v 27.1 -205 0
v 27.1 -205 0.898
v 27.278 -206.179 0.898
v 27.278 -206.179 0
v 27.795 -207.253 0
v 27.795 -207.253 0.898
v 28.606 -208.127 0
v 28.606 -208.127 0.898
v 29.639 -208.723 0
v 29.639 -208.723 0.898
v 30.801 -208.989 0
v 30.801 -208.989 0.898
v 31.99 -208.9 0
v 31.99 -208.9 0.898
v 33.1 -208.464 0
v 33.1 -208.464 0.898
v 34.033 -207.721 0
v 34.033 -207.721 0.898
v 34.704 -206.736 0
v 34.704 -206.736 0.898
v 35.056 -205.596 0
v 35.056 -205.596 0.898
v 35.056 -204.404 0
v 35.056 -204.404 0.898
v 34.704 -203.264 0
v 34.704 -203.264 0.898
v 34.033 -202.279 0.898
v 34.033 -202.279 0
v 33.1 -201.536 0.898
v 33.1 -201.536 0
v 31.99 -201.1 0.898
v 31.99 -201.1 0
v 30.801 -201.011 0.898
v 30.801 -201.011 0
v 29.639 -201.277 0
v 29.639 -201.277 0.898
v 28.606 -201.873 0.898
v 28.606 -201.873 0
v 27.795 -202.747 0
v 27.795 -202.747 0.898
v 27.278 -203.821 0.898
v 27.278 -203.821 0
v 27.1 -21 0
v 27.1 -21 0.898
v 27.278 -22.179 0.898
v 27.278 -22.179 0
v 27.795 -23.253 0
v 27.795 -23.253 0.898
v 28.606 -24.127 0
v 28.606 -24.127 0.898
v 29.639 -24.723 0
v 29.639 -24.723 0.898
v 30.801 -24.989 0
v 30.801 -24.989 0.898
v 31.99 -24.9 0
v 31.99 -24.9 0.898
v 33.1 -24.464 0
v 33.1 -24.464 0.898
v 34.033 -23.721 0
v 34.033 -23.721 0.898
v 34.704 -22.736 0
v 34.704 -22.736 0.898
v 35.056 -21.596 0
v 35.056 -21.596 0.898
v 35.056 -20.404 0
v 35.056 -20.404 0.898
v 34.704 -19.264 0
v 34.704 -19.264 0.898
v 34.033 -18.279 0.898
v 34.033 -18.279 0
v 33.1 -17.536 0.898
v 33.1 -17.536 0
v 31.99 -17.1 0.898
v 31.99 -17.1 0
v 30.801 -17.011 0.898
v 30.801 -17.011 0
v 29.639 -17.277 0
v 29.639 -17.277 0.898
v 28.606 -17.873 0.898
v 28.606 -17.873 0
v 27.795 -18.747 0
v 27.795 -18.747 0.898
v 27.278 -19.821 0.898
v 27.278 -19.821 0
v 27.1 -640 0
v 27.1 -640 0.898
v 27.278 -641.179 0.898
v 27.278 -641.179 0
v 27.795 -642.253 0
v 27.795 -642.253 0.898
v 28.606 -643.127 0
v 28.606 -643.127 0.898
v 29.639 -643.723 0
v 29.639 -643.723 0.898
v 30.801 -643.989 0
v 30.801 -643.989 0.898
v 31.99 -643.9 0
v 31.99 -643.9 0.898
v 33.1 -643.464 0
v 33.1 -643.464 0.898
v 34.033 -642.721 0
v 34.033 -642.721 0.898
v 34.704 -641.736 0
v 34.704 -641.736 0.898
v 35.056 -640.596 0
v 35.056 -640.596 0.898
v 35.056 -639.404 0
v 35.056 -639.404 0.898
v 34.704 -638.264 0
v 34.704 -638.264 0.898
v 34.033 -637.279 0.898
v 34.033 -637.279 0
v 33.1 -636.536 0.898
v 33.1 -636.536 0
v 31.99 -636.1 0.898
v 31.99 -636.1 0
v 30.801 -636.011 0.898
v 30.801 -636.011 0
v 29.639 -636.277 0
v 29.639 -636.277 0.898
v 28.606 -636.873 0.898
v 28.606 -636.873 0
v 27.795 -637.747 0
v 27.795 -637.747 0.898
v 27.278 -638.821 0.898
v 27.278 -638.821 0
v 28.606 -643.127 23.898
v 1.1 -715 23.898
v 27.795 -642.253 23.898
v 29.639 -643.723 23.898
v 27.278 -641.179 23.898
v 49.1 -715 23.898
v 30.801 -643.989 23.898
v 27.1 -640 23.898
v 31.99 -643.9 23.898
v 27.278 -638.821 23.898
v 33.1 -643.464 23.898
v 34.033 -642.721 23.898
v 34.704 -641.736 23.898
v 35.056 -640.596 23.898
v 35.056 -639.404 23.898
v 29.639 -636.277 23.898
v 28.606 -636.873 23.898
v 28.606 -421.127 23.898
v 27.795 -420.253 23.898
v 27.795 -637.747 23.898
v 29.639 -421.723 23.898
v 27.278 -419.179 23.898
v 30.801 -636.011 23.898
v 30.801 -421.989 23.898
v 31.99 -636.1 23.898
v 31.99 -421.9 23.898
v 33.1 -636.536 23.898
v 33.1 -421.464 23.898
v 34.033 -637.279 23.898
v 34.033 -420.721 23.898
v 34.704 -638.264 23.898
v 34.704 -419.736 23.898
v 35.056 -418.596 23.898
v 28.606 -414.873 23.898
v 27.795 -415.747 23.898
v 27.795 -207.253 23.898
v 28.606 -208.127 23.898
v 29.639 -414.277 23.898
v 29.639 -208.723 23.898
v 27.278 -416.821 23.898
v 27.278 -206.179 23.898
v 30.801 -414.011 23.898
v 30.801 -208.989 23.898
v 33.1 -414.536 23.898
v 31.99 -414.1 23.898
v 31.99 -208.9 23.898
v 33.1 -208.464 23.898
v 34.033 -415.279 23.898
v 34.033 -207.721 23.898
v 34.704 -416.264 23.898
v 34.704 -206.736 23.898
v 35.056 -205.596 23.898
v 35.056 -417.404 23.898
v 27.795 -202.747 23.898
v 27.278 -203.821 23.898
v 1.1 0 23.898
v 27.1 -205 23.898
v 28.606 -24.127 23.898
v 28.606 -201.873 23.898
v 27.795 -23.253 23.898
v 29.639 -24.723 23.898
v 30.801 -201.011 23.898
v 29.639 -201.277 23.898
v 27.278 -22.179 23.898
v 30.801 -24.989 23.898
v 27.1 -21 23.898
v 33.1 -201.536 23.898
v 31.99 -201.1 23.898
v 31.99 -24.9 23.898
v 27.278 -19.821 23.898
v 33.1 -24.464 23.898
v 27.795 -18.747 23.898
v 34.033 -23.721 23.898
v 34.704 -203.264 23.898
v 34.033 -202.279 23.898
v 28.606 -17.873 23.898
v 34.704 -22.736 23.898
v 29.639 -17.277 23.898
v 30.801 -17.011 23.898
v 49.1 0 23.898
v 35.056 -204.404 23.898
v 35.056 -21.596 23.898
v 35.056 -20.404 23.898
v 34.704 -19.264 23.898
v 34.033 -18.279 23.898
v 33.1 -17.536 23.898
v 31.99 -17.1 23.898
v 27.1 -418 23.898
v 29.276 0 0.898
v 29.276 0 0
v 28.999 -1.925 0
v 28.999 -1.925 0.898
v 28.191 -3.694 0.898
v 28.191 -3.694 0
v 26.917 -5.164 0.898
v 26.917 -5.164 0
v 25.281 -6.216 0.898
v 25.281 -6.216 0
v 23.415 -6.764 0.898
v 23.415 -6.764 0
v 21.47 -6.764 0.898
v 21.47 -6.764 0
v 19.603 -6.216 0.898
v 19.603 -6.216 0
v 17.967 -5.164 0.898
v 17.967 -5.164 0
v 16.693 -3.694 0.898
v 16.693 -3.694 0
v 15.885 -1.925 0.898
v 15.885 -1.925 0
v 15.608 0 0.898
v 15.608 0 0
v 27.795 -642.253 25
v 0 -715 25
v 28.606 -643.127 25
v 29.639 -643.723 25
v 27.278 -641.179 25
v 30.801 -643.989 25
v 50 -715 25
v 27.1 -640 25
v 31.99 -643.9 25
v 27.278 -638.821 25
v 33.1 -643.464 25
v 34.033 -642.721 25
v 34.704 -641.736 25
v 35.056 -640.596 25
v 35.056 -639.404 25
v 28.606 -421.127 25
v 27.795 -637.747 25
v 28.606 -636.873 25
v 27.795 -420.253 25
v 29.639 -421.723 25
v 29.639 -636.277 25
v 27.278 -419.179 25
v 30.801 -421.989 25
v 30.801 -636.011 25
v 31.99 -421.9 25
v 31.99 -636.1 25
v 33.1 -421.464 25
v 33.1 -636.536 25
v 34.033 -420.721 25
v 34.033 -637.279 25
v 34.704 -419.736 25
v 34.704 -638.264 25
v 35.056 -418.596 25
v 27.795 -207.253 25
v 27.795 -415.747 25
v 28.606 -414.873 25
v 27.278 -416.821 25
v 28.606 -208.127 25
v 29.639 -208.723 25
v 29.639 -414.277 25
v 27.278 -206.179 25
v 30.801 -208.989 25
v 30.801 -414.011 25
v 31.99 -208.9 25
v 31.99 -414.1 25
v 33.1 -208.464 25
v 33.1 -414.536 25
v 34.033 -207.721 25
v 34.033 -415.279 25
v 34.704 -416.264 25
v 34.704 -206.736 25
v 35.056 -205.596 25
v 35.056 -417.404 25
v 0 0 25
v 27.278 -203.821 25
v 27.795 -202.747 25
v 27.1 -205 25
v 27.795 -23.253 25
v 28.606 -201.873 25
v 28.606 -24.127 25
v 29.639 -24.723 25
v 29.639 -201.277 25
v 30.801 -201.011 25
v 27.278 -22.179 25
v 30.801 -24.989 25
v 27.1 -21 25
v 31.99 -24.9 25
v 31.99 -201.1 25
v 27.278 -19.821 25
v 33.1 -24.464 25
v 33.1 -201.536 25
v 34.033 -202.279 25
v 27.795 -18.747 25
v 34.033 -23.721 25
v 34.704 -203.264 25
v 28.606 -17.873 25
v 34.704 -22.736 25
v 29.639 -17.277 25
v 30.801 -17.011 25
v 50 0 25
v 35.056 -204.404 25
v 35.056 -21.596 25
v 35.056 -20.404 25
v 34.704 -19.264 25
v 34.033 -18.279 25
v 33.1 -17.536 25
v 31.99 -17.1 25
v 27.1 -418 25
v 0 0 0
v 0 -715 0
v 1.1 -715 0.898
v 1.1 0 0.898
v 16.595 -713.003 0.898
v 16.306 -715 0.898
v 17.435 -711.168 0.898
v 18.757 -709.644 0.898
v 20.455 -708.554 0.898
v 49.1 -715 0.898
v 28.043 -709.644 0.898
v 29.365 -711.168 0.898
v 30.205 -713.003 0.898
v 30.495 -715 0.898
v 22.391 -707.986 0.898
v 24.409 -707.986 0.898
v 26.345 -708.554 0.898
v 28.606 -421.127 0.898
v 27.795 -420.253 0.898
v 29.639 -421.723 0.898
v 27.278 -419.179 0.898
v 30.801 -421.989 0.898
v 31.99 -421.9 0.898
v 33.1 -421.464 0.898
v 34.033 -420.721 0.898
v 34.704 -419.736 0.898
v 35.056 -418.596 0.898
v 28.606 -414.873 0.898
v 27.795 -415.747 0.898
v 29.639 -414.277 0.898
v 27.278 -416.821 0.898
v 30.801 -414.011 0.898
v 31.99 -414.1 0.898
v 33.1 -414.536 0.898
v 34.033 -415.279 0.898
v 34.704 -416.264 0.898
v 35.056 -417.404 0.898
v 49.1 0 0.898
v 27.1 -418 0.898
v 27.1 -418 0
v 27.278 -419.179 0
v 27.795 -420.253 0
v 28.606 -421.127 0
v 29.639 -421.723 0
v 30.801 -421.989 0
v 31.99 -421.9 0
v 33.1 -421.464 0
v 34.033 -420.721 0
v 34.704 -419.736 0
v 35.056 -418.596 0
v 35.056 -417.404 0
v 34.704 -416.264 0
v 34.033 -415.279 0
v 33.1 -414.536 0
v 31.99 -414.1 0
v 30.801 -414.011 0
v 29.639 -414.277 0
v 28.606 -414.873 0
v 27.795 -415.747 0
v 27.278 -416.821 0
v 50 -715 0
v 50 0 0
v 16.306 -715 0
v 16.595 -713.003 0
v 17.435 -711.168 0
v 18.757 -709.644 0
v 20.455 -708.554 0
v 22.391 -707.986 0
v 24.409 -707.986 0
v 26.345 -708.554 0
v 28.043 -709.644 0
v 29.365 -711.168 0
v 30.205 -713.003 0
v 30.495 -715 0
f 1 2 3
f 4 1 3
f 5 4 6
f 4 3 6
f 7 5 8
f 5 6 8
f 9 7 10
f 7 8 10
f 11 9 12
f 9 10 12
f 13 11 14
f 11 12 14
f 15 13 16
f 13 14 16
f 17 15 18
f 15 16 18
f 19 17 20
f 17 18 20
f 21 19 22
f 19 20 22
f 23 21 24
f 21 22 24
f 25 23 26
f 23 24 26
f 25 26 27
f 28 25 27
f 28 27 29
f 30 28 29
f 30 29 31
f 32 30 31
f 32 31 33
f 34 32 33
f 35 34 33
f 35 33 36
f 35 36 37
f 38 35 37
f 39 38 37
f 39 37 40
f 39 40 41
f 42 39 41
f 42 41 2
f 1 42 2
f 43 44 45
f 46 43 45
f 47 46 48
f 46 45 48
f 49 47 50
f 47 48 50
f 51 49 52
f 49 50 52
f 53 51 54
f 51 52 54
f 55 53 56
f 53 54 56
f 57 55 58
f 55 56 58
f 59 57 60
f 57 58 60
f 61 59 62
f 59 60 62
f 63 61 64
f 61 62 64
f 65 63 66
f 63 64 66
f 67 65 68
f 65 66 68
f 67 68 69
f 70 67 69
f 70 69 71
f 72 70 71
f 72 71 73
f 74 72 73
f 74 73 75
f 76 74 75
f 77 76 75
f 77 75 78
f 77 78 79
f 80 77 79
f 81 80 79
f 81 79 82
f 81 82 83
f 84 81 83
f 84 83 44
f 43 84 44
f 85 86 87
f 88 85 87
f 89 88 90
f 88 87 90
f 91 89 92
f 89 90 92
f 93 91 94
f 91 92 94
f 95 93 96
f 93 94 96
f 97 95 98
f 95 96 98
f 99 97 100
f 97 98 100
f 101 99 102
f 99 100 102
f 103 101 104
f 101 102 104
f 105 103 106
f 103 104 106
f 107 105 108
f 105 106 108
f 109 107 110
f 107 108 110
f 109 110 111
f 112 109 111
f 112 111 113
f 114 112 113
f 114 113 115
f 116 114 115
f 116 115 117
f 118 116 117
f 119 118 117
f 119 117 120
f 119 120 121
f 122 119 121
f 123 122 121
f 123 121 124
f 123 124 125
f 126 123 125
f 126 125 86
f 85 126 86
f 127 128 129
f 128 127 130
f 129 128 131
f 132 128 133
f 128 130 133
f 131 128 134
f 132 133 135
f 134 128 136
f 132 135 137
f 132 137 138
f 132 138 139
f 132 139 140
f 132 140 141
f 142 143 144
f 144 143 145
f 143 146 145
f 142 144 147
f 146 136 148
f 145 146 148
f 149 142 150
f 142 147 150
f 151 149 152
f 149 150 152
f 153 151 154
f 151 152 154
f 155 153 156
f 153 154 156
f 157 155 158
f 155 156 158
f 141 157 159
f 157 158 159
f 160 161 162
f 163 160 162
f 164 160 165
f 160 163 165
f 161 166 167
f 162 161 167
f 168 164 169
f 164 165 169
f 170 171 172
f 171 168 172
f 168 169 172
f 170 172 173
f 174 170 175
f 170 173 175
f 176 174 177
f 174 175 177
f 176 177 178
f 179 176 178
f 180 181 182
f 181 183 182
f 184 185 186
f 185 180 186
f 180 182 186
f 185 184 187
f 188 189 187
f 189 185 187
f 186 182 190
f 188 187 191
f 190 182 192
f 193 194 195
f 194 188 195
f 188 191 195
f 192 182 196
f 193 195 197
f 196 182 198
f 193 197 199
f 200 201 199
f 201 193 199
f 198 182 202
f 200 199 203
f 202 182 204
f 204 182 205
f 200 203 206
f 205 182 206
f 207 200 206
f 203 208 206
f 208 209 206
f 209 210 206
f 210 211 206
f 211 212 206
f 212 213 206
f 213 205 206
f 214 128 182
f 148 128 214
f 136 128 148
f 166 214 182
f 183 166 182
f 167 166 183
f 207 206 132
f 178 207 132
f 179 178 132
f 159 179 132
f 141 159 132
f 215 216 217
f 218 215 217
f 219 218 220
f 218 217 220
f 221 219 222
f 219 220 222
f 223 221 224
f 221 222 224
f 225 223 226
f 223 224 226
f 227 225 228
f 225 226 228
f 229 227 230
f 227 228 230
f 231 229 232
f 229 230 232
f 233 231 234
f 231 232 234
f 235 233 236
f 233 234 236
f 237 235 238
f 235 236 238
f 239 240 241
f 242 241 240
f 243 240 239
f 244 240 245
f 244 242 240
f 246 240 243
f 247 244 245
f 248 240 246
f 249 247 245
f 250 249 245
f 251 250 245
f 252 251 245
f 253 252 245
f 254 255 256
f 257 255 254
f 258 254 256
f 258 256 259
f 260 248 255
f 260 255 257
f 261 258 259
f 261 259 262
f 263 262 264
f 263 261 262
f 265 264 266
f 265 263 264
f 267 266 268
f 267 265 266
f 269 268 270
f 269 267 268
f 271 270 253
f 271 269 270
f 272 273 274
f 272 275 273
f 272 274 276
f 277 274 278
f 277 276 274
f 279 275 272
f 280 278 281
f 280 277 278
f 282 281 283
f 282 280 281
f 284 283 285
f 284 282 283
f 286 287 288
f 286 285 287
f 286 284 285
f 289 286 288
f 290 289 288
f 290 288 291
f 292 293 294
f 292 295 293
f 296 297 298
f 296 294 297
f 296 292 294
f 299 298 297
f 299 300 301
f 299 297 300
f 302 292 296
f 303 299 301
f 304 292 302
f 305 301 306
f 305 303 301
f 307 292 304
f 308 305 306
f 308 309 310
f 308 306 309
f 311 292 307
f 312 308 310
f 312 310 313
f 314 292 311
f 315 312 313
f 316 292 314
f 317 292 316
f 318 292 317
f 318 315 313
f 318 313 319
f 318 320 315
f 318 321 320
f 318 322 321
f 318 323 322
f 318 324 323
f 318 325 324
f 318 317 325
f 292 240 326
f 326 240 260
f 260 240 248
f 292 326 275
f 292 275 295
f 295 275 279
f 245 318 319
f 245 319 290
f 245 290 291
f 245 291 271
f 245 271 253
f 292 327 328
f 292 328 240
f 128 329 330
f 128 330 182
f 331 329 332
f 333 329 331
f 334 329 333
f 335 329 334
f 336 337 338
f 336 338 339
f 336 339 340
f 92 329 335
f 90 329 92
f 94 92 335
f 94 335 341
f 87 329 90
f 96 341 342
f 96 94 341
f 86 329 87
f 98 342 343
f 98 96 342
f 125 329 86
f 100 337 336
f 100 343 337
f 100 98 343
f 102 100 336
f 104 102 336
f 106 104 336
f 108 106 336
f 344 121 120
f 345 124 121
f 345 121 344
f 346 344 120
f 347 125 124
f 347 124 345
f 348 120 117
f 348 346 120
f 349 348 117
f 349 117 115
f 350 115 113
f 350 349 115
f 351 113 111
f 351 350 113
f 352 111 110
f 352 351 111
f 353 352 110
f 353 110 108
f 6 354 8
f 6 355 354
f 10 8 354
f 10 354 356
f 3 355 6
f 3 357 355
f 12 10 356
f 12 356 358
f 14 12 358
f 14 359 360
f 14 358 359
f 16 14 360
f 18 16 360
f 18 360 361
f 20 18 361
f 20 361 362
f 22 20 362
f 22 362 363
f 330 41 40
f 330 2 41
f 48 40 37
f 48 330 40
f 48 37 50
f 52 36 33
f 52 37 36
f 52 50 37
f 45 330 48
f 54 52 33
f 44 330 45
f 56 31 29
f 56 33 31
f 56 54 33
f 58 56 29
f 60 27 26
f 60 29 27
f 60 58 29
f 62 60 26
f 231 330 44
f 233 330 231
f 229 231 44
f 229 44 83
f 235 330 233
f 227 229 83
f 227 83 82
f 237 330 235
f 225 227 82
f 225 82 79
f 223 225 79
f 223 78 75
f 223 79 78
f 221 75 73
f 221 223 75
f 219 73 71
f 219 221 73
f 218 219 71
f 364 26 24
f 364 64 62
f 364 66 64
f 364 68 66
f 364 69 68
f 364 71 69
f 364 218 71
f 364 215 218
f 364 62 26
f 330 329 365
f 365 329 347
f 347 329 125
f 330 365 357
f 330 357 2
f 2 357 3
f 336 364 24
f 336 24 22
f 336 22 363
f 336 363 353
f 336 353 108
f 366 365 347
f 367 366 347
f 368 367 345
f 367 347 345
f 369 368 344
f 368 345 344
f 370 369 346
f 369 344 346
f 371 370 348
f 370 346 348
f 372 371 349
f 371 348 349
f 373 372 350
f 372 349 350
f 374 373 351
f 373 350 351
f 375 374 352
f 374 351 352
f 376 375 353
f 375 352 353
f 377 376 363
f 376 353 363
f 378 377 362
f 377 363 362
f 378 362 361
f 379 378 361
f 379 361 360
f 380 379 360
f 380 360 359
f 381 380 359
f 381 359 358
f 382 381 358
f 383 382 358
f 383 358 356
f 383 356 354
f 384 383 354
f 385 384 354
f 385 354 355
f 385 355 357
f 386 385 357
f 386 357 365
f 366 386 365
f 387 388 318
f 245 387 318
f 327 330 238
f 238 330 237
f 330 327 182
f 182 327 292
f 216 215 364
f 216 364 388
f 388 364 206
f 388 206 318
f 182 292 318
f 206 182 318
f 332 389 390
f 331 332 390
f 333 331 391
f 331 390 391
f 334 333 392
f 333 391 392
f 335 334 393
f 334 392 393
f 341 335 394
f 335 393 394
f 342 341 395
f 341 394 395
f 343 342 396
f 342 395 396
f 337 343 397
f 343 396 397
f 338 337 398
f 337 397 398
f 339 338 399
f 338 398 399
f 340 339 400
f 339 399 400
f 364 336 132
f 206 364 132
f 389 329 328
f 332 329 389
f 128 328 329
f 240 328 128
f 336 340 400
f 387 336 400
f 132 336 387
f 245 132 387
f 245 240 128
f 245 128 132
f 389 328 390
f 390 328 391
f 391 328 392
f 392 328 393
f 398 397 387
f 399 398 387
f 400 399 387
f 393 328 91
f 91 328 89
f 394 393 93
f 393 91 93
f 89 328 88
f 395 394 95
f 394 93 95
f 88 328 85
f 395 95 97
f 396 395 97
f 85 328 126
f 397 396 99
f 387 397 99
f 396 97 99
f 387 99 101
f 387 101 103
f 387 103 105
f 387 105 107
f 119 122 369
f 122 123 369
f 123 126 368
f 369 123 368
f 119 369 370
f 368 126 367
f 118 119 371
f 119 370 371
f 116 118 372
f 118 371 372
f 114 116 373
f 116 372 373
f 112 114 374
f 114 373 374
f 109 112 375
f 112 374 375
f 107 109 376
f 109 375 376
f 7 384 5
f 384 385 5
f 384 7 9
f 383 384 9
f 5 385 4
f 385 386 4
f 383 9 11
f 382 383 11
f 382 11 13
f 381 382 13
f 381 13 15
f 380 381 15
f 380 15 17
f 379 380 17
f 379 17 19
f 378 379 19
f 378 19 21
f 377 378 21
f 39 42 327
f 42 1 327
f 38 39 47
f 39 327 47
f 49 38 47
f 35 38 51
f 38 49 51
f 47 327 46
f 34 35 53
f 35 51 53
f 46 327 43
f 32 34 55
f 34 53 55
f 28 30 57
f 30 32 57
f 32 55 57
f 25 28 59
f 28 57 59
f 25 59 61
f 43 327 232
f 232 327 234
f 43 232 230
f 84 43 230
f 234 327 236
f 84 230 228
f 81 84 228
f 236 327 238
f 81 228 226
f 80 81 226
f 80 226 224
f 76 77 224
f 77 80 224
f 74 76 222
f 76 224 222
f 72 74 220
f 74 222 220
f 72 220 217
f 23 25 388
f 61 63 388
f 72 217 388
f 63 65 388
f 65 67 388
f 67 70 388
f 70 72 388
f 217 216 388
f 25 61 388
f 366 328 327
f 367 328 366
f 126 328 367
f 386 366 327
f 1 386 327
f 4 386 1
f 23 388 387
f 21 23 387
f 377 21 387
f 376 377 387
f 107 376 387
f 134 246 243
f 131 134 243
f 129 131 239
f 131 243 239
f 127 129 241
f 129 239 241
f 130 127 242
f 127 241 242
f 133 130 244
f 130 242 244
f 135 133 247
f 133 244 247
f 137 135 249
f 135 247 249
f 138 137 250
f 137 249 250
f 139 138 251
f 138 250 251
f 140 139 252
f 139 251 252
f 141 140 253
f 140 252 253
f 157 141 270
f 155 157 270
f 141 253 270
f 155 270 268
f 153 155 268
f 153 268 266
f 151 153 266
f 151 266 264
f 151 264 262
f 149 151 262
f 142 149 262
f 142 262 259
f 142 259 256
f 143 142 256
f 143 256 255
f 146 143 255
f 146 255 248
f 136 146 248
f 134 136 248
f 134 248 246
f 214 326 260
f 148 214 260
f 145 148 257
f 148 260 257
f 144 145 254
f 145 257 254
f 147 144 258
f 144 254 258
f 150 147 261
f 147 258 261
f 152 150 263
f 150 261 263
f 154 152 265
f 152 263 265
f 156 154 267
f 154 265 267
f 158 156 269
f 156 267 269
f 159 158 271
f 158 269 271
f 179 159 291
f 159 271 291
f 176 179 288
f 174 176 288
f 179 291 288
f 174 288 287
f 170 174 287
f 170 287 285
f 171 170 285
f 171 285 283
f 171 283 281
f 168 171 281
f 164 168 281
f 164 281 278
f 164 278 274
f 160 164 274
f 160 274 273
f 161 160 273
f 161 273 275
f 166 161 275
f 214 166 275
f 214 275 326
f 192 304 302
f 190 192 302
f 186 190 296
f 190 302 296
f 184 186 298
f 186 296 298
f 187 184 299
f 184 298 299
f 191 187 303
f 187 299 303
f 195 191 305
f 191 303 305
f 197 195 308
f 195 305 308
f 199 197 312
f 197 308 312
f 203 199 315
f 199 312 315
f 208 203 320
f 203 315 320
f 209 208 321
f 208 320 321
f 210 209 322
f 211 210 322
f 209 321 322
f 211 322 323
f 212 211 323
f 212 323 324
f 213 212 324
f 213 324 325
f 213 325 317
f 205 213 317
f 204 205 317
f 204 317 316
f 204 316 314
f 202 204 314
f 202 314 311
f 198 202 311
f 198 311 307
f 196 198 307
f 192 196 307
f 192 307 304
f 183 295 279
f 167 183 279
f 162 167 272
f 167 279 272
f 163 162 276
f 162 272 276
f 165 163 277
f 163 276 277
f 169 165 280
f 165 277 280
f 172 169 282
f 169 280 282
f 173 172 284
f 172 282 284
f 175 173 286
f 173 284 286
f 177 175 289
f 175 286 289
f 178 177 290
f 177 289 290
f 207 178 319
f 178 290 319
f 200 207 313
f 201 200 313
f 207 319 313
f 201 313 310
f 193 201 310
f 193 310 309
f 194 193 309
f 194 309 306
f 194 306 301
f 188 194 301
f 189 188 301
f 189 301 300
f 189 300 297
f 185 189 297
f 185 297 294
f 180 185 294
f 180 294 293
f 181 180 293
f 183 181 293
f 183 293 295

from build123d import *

# Parameters (mm, degrees)
F0_W     = 50
F0_H     = 25
F0_W_2   = 48
F0_H_2   = 23
F1_DEPTH = 715
F3_D     = 8
F5_R     = 6.8335490291
F6_DEPTH = 5
F7_R     = 7.0945759033
F8_DEPTH = 5


with BuildPart() as f1:
    # F0 (on Front) → F1 (new body)
    with BuildSketch(Plane.XZ):
        with Locations((25, 12.5)):
            Rectangle(F0_W, F0_H)
        with Locations((25.1003231639, 12.3982938598)):
            Rectangle(F0_W_2, F0_H_2, mode=Mode.SUBTRACT)
    extrude(amount=F1_DEPTH)

    # F3 (through all)
    with Locations(Plane(origin=(0, 0, 0), x_dir=(1, 0, 0), z_dir=(0, 0, -1))):
        with Locations((31.1003231639, 21), (31.1003231639, 205), (31.1003231639, 418), (31.1003231639, 640)):
            Hole(F3_D / 2)

    # F5 (on offset) → F6 (cut)
    with BuildSketch(Plane(origin=(0, 0, 0), x_dir=(1, 0, 0), z_dir=(0, 0, -1))):
        with Locations((22.4420260638, 0)):
            Circle(F5_R)
    extrude(amount=-F6_DEPTH, mode=Mode.SUBTRACT)

    # F7 (on offset) → F8 (cut)
    with BuildSketch(Plane(origin=(0, 0, 0), x_dir=(1, 0, 0), z_dir=(0, 0, -1))):
        with Locations((23.400099948, 715.0086760521)):
            Circle(F7_R)
    extrude(amount=-F8_DEPTH, mode=Mode.SUBTRACT)


solid = f1.part
